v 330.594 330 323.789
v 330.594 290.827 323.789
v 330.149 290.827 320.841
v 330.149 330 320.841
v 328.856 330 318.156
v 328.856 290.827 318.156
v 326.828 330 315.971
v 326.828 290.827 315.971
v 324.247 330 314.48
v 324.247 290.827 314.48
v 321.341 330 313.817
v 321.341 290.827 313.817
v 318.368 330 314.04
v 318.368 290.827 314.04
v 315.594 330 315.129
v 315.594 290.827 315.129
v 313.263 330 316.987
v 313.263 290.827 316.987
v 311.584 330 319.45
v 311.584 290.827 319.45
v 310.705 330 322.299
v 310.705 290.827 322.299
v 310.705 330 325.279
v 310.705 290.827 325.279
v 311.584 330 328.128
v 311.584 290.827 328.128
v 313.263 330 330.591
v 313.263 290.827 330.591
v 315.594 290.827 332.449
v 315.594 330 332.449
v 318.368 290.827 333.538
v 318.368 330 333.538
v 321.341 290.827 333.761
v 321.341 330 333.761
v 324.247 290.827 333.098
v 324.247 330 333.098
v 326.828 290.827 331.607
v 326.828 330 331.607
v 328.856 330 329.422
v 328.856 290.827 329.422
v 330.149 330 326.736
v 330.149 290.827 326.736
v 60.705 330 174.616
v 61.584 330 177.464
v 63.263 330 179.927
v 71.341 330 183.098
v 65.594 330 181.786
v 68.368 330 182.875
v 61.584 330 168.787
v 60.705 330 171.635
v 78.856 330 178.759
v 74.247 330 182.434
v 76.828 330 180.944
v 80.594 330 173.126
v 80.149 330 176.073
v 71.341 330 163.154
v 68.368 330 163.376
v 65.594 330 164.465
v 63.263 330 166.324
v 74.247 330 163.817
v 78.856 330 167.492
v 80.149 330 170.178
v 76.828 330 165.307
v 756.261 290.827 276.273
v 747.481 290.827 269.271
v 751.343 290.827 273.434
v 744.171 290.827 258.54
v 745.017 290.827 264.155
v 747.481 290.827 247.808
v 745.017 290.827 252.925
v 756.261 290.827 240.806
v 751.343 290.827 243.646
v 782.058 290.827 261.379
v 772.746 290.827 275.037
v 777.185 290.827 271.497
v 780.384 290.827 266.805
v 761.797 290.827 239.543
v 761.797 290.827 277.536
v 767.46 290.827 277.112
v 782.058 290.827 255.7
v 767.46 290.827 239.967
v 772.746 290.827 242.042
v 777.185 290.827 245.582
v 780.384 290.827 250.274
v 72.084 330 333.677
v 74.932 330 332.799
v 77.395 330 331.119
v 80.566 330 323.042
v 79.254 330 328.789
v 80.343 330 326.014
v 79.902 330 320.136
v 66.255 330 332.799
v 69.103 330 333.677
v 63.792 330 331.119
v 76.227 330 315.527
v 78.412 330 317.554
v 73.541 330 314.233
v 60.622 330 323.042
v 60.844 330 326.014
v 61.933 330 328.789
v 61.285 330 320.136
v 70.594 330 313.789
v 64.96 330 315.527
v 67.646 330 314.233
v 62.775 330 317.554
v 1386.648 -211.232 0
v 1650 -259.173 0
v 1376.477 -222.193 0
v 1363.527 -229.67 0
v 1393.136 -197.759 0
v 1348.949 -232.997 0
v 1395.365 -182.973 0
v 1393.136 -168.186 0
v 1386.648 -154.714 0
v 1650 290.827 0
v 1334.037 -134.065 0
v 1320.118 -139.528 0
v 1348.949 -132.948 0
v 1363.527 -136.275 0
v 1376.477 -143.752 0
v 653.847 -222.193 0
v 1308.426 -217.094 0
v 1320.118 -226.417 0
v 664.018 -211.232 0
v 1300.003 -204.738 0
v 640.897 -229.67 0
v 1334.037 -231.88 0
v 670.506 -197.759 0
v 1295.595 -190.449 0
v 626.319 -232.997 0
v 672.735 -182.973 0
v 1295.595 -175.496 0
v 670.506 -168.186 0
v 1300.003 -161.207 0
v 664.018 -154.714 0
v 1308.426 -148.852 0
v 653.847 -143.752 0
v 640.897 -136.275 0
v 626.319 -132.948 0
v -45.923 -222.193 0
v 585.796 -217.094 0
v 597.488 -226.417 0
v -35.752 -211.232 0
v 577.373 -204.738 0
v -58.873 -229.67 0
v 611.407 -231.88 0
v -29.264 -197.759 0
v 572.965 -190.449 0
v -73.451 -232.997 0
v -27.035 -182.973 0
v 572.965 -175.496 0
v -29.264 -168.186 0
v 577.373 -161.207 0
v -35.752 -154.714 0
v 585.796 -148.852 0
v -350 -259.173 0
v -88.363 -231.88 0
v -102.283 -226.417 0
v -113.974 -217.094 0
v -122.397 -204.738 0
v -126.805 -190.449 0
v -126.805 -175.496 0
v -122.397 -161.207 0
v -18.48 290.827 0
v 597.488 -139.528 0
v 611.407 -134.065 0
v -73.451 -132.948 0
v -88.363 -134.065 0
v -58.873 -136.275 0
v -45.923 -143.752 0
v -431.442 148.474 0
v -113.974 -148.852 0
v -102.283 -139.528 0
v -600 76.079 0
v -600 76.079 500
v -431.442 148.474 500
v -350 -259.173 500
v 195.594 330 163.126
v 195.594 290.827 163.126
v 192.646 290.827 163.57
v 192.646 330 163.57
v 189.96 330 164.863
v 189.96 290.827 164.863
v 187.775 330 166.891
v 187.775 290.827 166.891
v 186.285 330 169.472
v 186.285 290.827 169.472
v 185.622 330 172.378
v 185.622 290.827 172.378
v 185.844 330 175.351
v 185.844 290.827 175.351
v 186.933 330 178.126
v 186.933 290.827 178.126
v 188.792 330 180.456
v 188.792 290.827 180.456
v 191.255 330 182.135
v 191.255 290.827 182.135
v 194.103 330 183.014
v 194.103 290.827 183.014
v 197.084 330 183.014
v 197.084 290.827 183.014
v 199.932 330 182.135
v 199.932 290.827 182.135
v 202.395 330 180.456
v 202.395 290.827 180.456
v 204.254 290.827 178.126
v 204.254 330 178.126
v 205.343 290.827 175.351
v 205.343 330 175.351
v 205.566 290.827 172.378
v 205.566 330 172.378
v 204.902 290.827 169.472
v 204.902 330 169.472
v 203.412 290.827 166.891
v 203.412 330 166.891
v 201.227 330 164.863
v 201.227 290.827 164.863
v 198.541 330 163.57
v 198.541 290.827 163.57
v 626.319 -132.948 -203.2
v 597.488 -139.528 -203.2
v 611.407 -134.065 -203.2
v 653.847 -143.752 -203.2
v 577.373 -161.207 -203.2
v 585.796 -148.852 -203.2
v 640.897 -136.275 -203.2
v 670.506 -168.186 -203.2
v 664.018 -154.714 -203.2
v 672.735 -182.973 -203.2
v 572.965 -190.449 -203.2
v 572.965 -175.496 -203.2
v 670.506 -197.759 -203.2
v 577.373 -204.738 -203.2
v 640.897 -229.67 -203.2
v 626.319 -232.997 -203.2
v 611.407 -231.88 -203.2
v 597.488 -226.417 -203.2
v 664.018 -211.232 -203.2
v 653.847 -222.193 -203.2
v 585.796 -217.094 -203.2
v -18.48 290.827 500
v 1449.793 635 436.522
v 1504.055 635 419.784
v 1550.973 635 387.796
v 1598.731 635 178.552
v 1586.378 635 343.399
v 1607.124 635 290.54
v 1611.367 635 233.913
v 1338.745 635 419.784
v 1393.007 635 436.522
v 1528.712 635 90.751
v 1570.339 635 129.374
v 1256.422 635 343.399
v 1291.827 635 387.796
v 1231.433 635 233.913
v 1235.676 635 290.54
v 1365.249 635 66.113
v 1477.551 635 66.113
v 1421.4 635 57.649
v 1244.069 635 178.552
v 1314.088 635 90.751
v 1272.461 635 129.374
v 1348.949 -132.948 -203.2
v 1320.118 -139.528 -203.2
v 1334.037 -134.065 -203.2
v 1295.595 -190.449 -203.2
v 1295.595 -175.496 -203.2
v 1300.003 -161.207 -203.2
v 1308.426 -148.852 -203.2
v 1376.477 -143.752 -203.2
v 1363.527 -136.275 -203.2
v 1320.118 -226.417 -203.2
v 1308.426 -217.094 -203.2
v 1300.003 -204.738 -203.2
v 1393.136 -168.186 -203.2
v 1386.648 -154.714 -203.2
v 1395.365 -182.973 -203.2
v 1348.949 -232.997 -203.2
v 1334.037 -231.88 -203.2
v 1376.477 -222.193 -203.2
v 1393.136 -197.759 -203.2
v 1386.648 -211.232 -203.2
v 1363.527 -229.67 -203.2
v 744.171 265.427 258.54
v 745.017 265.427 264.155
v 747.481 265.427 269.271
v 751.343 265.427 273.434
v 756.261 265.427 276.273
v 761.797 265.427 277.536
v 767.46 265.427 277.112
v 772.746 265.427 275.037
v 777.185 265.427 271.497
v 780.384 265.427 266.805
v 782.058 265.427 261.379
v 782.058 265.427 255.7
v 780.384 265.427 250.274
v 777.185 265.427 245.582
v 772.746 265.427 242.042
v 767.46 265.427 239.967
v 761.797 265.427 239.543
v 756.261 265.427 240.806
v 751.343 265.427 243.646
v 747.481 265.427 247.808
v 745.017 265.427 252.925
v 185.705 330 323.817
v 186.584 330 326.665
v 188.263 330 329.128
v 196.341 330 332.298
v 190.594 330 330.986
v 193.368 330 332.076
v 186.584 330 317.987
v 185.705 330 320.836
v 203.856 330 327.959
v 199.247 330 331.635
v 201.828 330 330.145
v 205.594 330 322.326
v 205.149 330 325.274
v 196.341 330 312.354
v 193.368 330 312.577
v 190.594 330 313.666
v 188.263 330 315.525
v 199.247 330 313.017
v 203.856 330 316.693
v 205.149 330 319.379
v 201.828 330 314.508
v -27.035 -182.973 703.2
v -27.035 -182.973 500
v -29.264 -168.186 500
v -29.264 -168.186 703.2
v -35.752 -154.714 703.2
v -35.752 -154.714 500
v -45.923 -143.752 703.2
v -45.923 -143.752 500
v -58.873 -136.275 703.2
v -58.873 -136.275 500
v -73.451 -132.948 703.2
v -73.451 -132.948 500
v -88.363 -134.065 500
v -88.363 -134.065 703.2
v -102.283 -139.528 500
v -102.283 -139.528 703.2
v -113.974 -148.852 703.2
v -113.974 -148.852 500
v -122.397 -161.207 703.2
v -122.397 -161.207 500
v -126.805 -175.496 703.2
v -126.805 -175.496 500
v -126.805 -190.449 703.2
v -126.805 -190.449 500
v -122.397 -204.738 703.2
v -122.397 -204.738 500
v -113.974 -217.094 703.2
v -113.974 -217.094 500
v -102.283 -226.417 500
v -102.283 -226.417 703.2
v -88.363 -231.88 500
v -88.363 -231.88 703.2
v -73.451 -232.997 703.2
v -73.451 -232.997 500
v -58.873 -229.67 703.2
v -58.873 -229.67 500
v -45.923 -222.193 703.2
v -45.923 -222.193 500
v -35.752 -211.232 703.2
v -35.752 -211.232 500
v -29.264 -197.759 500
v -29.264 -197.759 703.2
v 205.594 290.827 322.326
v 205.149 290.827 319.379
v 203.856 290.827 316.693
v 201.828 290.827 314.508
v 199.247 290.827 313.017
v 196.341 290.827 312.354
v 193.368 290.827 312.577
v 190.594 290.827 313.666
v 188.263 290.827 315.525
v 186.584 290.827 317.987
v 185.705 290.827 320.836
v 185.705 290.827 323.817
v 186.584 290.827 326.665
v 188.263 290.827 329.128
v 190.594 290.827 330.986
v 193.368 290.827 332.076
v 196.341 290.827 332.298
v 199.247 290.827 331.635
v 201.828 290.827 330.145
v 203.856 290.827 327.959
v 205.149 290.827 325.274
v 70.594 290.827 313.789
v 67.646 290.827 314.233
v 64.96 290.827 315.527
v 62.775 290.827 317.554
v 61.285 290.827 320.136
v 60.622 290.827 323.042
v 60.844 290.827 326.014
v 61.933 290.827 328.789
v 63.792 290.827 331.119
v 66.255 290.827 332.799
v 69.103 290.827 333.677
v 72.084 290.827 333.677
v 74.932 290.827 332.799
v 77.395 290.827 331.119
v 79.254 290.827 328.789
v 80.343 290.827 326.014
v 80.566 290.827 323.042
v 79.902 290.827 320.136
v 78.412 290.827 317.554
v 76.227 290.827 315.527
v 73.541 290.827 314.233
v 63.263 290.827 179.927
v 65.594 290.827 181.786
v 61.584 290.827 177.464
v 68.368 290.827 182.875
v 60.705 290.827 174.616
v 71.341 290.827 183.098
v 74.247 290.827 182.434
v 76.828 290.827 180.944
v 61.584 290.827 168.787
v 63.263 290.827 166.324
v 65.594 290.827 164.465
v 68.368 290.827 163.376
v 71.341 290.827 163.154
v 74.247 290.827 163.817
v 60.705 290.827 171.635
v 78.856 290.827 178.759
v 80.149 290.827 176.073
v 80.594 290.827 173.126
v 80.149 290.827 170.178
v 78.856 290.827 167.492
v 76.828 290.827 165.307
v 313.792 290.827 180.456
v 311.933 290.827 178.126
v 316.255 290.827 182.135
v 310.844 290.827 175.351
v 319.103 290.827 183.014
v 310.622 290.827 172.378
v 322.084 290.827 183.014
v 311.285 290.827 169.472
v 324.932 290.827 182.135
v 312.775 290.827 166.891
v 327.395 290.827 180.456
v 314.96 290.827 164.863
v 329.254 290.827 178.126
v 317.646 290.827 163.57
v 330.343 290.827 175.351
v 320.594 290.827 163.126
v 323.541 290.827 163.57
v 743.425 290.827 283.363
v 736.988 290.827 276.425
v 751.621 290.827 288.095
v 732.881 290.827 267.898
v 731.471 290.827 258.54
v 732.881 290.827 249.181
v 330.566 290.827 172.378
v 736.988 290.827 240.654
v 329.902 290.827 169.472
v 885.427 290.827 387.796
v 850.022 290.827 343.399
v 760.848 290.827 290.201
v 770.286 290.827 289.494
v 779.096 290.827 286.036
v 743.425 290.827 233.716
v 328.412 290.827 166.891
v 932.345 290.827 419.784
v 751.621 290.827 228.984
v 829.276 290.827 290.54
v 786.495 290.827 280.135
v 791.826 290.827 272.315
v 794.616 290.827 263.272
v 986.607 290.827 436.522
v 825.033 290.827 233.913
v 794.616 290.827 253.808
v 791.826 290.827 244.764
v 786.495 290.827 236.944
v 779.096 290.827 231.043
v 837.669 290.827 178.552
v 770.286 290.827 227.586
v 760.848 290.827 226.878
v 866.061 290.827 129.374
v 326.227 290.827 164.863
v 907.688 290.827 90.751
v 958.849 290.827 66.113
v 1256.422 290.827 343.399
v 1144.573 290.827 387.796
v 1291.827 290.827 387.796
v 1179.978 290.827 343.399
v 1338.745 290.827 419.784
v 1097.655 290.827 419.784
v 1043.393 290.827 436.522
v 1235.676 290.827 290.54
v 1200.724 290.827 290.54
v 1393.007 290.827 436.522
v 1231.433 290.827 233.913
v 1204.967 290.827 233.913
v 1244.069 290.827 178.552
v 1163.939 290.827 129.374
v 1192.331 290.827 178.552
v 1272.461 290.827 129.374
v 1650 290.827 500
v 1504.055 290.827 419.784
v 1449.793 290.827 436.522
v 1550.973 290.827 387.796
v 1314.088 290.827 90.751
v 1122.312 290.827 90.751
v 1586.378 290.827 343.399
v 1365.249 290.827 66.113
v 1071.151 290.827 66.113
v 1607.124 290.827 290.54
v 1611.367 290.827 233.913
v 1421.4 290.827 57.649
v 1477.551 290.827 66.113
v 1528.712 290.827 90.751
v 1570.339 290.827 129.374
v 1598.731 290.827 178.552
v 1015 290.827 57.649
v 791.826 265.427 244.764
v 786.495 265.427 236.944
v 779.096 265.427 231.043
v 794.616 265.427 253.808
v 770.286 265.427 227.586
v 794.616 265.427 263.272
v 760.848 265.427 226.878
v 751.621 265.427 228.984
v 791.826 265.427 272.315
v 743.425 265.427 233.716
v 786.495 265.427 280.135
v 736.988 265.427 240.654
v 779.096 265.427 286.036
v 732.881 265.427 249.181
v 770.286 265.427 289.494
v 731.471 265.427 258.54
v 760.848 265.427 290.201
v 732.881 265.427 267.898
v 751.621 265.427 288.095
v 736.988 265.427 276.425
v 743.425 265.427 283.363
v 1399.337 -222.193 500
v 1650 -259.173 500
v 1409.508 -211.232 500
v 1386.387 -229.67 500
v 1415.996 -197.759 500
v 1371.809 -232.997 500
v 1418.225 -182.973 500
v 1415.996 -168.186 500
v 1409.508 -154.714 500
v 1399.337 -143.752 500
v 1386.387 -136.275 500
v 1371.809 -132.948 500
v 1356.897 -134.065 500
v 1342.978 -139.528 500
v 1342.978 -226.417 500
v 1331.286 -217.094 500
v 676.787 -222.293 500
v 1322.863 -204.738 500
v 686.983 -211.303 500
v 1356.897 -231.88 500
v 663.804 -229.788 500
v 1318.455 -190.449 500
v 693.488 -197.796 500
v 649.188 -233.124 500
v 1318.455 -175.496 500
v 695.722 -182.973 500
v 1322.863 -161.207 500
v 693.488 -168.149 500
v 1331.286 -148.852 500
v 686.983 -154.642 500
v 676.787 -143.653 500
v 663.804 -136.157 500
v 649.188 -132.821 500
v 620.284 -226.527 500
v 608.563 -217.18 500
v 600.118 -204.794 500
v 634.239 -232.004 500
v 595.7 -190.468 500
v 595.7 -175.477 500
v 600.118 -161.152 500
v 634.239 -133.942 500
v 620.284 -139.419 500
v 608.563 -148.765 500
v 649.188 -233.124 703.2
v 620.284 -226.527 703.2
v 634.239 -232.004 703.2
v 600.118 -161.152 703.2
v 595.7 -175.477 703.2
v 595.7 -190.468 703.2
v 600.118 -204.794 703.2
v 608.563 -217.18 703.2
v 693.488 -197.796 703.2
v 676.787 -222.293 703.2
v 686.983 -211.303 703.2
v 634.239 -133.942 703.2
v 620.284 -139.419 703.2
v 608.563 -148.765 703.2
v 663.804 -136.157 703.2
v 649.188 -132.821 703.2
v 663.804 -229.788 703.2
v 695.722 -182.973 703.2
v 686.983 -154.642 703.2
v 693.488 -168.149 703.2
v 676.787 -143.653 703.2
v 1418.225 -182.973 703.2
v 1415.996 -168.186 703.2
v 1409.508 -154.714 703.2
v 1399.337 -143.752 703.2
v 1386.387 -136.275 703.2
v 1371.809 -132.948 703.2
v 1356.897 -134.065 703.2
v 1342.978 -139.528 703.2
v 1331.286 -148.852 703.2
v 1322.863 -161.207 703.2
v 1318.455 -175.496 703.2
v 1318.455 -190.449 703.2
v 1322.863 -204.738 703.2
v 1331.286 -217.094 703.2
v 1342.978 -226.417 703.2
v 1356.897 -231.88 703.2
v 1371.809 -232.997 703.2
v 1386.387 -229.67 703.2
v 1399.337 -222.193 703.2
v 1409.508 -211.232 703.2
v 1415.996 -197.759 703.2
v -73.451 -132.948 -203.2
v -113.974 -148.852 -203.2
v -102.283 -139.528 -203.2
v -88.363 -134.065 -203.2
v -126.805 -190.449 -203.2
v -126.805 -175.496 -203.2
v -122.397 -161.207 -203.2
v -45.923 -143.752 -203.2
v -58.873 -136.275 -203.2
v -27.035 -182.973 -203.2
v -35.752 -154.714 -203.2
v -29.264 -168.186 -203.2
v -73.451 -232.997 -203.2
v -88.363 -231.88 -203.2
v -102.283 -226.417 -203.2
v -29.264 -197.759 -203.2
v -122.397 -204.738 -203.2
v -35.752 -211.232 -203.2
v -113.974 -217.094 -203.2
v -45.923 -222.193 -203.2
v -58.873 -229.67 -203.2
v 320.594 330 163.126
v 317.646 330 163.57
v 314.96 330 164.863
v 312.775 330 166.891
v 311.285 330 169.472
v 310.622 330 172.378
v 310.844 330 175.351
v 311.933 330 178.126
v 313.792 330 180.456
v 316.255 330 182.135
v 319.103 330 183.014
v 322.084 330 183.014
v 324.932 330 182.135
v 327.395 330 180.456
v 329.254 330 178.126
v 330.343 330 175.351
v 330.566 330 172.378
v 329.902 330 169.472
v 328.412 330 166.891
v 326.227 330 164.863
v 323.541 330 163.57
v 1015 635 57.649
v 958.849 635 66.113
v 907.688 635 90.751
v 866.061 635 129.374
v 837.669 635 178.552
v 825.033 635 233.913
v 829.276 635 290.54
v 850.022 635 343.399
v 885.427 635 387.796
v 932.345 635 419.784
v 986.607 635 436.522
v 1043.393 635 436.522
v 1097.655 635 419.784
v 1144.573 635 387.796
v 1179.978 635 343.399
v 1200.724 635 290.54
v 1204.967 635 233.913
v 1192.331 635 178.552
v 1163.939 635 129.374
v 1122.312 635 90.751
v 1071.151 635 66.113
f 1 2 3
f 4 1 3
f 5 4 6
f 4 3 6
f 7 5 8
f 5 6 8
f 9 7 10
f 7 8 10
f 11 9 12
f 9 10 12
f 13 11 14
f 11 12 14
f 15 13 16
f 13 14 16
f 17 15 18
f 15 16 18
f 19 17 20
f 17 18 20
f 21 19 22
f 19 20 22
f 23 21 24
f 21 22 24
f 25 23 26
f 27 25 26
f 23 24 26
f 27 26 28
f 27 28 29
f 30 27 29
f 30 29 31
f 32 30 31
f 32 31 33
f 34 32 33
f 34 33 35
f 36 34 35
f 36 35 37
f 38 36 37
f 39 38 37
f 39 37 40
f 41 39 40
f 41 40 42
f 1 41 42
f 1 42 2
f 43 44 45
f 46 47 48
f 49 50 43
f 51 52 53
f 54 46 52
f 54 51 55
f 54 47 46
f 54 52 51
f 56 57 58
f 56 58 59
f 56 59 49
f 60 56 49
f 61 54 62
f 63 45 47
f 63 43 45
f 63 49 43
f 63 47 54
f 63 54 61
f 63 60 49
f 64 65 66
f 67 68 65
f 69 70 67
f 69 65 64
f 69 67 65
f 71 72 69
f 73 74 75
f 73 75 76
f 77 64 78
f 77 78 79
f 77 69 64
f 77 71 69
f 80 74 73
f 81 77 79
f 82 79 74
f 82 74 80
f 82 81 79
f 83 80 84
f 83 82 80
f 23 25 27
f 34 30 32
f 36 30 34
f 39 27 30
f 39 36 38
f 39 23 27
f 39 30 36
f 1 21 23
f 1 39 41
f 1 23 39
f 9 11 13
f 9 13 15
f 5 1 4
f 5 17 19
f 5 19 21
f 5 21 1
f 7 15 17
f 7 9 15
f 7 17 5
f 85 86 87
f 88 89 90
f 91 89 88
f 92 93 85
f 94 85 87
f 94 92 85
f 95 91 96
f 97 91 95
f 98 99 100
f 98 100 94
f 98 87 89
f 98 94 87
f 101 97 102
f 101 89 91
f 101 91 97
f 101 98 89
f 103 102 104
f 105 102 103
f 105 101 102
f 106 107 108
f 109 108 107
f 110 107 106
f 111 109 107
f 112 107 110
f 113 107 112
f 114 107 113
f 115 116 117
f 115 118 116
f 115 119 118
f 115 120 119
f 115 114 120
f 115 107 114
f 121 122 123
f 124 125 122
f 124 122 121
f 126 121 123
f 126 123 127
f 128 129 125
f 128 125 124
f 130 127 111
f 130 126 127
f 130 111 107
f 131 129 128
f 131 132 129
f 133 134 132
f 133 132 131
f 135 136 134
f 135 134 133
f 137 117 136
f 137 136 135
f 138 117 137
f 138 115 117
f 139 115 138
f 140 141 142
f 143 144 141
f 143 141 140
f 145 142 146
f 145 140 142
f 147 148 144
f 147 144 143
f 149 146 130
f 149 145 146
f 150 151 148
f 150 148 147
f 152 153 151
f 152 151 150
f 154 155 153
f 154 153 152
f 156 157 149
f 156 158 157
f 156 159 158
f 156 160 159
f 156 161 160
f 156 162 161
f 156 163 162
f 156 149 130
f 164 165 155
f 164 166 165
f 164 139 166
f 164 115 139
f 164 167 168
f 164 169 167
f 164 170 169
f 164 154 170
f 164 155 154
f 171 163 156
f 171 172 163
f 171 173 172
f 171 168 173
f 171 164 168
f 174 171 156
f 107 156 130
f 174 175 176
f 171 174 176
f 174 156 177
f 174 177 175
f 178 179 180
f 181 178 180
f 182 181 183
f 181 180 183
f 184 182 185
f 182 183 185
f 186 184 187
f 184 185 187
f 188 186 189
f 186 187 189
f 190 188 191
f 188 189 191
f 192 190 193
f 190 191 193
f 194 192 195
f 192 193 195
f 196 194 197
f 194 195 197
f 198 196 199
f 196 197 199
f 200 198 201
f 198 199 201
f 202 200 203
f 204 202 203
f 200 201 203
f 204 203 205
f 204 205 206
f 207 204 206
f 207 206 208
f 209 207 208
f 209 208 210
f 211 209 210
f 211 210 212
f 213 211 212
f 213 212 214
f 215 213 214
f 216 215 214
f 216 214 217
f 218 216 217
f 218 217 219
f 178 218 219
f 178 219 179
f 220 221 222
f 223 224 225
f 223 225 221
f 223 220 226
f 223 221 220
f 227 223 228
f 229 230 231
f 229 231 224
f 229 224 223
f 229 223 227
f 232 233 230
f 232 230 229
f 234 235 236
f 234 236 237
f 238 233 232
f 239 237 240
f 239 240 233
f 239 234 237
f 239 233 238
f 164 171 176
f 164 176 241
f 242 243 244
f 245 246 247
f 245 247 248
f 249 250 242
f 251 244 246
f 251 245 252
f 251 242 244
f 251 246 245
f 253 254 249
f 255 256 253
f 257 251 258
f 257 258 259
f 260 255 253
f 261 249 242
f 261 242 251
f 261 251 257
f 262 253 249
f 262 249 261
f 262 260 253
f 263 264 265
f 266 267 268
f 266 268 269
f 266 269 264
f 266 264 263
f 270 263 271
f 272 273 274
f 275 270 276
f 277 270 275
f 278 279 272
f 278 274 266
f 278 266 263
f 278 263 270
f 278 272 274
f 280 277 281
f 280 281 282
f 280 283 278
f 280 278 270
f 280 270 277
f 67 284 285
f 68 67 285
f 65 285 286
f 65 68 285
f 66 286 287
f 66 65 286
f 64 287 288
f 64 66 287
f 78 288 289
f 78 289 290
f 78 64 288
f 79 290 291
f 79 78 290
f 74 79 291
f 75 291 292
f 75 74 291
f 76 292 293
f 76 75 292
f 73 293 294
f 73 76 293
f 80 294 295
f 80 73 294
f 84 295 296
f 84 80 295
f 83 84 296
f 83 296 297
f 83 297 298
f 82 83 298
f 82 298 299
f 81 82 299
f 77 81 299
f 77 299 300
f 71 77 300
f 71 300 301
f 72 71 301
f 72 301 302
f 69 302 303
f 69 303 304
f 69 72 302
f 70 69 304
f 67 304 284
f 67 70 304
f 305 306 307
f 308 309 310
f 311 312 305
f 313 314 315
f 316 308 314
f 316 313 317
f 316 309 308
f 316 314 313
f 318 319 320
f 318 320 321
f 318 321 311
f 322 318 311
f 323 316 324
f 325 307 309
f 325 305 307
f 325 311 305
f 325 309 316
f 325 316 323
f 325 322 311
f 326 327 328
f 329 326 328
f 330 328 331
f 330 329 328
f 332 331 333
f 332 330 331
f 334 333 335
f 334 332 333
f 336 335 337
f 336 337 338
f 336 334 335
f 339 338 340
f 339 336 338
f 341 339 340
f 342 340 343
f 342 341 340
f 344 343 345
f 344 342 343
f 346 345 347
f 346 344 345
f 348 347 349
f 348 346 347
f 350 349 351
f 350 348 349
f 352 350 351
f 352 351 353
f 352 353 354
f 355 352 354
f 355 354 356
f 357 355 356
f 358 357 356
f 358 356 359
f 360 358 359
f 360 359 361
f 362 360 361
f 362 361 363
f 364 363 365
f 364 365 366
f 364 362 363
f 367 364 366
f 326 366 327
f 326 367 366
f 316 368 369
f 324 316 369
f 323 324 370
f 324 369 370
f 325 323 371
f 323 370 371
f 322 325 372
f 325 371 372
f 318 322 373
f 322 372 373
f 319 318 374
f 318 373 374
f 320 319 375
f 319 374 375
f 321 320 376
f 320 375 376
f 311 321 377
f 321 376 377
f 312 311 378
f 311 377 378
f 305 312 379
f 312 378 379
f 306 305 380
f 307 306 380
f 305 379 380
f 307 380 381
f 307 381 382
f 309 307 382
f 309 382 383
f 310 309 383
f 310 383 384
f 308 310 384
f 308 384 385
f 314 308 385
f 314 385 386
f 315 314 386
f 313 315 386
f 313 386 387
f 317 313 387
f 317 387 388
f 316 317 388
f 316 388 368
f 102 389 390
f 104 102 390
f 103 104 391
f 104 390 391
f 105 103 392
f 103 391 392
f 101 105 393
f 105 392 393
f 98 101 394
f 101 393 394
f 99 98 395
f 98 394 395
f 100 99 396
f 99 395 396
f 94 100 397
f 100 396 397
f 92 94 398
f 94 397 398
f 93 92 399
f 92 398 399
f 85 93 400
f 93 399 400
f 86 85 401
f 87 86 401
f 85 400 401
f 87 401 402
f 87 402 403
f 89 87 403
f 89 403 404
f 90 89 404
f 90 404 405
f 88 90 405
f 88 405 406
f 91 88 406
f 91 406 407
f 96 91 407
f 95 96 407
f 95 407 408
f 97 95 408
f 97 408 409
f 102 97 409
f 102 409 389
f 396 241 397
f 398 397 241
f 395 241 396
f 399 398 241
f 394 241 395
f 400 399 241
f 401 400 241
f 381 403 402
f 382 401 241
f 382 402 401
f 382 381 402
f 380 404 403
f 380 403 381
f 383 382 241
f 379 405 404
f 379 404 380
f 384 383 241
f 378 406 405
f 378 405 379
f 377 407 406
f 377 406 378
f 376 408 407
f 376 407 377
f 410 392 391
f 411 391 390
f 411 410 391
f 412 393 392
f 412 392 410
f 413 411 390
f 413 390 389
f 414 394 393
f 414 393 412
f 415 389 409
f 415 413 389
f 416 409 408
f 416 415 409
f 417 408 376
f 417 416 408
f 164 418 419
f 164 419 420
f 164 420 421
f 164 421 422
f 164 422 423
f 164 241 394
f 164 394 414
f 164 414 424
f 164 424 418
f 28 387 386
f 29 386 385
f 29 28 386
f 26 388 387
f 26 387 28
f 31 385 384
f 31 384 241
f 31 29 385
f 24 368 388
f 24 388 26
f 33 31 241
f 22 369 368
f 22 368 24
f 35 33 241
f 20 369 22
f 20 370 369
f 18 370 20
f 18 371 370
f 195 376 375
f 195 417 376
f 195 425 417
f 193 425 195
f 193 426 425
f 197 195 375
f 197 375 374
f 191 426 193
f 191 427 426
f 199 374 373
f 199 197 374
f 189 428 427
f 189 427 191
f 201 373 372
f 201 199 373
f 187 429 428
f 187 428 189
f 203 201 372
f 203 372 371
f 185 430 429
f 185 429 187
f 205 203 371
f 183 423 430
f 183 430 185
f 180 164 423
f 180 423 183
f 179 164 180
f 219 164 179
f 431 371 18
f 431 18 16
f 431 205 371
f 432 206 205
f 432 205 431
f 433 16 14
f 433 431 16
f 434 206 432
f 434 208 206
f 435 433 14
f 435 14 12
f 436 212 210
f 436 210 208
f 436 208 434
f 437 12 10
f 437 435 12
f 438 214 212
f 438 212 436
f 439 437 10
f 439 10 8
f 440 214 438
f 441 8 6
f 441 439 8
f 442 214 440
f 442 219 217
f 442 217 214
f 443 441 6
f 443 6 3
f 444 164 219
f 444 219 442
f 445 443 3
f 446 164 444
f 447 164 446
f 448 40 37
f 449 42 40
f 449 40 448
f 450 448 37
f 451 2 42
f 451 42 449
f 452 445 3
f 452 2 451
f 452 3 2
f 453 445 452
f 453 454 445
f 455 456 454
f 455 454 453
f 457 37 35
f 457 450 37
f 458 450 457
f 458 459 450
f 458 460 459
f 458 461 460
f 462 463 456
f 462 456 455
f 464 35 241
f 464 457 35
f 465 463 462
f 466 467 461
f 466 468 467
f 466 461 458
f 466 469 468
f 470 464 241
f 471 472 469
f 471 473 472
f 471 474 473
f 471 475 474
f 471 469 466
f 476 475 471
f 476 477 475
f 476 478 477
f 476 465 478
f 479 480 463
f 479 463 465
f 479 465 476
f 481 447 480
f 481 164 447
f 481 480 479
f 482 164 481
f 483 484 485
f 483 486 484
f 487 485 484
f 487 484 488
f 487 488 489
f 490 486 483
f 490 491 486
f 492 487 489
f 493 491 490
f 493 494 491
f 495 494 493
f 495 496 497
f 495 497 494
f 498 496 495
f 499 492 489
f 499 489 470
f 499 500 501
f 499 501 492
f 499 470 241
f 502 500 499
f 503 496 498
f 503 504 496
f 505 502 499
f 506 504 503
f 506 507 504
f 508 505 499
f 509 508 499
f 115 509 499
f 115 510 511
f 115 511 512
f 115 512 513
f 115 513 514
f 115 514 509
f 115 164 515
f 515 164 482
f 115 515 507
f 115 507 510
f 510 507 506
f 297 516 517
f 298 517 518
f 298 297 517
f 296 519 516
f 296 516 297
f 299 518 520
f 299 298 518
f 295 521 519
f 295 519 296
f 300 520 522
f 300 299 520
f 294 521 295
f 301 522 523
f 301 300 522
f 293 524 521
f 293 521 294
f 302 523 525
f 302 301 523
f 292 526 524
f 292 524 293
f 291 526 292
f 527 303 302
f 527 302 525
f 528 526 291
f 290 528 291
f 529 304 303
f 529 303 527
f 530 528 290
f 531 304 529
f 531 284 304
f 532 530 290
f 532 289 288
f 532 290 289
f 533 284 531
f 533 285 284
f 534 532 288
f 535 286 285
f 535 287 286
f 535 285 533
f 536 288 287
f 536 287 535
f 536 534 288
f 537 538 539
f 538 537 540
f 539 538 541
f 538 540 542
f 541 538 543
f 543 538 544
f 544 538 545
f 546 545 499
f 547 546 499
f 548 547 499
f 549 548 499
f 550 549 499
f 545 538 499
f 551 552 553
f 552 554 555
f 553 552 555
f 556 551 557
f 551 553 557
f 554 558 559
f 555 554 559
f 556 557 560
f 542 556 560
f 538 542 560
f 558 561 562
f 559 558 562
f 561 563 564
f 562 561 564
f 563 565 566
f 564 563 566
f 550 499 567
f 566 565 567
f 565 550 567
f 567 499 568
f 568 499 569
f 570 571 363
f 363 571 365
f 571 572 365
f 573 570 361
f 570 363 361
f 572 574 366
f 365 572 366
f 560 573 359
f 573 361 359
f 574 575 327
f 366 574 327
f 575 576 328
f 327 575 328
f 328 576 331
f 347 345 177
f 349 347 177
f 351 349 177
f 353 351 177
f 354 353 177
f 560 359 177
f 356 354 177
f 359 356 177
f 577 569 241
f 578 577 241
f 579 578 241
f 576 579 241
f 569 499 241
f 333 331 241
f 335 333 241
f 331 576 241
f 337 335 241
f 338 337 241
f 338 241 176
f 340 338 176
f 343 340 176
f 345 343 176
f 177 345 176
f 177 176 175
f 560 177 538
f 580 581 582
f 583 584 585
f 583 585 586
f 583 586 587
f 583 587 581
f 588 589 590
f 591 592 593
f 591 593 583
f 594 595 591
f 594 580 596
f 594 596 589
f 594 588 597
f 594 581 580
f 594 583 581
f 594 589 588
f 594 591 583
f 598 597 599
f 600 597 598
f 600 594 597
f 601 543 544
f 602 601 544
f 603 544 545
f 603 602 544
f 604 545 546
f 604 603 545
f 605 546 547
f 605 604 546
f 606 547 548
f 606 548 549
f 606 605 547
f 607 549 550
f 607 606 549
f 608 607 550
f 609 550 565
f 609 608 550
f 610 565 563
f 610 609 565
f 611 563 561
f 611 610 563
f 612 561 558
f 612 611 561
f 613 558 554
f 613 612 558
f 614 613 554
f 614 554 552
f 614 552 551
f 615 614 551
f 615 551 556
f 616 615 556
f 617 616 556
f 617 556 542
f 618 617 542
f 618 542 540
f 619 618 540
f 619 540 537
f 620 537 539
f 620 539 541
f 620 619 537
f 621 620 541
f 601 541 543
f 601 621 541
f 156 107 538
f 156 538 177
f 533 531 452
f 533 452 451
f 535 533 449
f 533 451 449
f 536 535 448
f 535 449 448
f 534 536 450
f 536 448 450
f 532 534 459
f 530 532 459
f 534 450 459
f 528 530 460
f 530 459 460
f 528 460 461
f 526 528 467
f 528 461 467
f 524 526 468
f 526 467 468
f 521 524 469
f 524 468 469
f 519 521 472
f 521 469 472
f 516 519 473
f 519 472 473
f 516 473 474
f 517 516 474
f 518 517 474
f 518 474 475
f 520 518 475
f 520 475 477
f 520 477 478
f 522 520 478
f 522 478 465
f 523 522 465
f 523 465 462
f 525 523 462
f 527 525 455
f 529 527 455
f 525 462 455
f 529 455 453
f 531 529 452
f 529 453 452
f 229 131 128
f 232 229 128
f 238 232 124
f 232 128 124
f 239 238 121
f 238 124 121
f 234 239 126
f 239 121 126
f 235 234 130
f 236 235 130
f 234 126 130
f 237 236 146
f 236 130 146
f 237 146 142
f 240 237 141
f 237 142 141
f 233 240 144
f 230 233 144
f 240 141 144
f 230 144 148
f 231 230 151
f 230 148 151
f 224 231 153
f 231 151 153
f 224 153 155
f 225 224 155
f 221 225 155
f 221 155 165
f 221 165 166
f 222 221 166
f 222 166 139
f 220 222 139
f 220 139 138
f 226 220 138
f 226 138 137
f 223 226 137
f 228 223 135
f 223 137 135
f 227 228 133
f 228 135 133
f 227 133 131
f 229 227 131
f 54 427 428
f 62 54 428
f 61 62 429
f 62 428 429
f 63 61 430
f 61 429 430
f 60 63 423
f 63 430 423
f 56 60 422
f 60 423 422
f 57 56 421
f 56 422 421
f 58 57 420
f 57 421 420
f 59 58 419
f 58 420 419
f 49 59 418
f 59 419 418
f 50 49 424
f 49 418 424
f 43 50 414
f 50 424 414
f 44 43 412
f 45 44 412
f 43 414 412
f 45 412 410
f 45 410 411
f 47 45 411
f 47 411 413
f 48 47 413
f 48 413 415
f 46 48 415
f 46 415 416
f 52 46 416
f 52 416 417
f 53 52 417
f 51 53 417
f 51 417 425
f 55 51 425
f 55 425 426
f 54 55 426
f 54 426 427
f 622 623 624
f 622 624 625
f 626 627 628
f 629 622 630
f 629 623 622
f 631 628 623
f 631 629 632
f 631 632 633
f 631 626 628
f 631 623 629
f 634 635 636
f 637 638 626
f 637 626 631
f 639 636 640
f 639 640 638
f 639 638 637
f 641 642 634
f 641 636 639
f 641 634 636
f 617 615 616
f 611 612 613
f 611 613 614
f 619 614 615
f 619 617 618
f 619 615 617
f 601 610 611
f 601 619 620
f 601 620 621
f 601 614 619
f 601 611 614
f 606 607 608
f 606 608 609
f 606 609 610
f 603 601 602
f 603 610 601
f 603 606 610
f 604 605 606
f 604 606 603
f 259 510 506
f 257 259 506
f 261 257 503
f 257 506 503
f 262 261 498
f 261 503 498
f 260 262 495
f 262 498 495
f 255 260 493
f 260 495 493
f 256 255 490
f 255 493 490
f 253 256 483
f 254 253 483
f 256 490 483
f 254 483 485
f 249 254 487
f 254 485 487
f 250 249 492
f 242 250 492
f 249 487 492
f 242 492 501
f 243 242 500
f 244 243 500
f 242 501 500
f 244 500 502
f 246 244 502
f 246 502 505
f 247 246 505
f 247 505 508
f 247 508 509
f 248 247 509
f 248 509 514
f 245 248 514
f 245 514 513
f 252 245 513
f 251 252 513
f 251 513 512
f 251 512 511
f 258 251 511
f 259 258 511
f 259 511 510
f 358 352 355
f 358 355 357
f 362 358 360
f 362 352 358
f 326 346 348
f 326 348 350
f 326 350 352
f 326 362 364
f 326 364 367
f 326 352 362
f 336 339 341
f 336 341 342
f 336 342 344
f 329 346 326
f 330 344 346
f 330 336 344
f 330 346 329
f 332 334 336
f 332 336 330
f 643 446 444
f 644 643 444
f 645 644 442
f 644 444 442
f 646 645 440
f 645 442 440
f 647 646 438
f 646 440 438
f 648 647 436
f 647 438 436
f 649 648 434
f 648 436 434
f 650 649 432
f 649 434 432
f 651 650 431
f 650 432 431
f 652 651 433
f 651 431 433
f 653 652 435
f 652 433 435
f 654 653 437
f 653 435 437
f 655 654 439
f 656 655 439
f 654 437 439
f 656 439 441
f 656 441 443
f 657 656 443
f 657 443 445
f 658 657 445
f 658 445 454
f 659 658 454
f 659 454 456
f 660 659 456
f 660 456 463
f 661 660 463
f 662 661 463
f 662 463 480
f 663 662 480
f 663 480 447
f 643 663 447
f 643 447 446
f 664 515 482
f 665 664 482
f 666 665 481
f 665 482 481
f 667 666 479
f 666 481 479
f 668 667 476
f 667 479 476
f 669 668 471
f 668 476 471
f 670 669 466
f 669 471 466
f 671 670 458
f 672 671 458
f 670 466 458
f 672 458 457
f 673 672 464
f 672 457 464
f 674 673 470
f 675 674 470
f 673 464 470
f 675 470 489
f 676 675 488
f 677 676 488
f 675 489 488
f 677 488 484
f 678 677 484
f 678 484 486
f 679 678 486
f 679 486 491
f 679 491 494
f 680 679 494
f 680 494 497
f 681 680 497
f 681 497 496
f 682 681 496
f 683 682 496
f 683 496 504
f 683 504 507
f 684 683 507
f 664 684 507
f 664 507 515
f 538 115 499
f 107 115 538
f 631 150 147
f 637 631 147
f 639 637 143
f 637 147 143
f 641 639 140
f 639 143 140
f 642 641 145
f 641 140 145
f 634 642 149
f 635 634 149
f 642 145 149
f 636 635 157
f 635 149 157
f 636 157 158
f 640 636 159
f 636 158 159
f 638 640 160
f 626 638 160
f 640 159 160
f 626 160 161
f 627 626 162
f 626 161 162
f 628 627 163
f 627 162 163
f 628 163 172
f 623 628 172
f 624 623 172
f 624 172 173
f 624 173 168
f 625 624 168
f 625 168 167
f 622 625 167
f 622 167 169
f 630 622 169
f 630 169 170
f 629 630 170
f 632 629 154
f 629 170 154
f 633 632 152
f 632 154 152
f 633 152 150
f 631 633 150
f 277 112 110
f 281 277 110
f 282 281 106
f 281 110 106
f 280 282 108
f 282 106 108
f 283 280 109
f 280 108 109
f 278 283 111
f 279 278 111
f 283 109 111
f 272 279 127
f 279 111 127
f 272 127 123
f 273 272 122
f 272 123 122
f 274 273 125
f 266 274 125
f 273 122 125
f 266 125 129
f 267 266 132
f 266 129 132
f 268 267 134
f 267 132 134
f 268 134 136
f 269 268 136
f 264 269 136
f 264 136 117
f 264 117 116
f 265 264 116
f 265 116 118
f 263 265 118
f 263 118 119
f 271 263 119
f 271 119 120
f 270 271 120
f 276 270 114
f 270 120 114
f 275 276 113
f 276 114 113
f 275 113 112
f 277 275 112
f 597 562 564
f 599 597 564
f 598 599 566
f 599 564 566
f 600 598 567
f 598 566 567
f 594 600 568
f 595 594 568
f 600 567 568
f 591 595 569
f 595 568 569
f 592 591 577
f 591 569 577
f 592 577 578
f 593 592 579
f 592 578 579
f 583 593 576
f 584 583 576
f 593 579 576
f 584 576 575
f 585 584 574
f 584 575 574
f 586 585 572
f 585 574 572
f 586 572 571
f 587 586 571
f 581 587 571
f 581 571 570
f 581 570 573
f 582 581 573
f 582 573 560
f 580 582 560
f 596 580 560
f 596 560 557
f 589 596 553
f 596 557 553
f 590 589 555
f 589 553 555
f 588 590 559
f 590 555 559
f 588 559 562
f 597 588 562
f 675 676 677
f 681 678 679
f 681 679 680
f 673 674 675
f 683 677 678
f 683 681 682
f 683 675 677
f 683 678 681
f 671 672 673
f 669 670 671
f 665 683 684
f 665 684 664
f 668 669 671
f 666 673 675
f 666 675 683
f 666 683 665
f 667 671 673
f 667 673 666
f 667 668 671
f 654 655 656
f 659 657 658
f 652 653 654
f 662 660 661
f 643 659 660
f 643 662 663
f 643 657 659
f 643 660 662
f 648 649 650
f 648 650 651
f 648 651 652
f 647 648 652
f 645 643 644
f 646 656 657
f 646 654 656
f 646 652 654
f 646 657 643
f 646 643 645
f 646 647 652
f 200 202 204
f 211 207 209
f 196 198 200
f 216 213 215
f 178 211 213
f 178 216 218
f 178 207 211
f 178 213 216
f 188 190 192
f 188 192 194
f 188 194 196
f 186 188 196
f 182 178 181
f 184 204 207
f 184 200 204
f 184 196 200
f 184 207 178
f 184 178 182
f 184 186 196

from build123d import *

# Parameters (mm, degrees)
BOSS_EXTRUDE1_DEPTH     = 500
CUT_EXTRUDE2_DEPTH      = 1749.450897396
CUT_EXTRUDE2_DEPTH_BACK = 1749.450897396
SKETCH11_R              = 10
BOSS_EXTRUDE8_DEPTH     = 330
SKETCH12_R              = 50.165
BOSS_EXTRUDE14_DEPTH    = 203.2
BOSS_EXTRUDE15_START    = 203.2
SKETCH15_R              = 50.165
BOSS_EXTRUDE15_DEPTH    = 203.2
SKETCH17_R              = 50.292
BOSS_EXTRUDE16_DEPTH    = 203.2
SKETCH18_R              = 50.165
BOSS_EXTRUDE17_DEPTH    = 203.2
SKETCH9_R               = 190.5
BOSS_EXTRUDE19_DEPTH    = 635
SKETCH19_R              = 31.75
SKETCH19_R_2            = 19.05
CUT_EXTRUDE5_DEPTH      = 25.4


with BuildPart() as part:
    # Sketch2 → Boss-Extrude1 (new body)
    with BuildSketch(Plane.XY):
        Polygon((-600, 76.079136691), (-100, 290.827338129), (1650, 290.827338129), (1650, -259.172661871), (-350, -259.172661871), align=None)
    extrude(amount=BOSS_EXTRUDE1_DEPTH)

    # Sketch3 → Cut-Extrude2 (cut, two sides: drawn at the far end of the back side and taken through both)
    with BuildSketch(Plane.XY.offset(-CUT_EXTRUDE2_DEPTH_BACK)):
        Polygon((-629.160159728, 80.318281341), (0, 297.197748554), (-133.945595933, 297.197748554), align=None)
    extrude(amount=CUT_EXTRUDE2_DEPTH + CUT_EXTRUDE2_DEPTH_BACK, mode=Mode.SUBTRACT)

    # Sketch11 → Boss-Extrude8 (add)
    with BuildSketch(Plane(origin=(0, 0, 0), x_dir=(1, 0, 0), z_dir=(0, 1, 0))):
        with Locations((320.593573559, -323.788946962)):
            Circle(SKETCH11_R)
        with Locations(Location((70.593573559, -323.788946962, 0), (0, 0, 90))):
            Circle(SKETCH11_R)
        with Locations((195.593573559, -322.326233751)):
            Circle(SKETCH11_R)
        with Locations(Location((320.593573559, -173.125553361, 0), (0, 0, 90))):
            Circle(SKETCH11_R)
        with Locations(Location((195.593573559, -173.125553361, 0), (0, 0, 90))):
            Circle(SKETCH11_R)
        with Locations((70.593573559, -173.125553361)):
            Circle(SKETCH11_R)
    extrude(amount=BOSS_EXTRUDE8_DEPTH)

    # Sketch12 → Boss-Extrude14 (add)
    with BuildSketch(Plane(origin=(0, 0, 0), x_dir=(-1, 0, 0), z_dir=(0, 0, -1))):
        with Locations(Location((-1345.2, -182.972661871, 0), (0, 0, 180))):
            Circle(SKETCH12_R)
        with Locations(Location((77.2, -182.972661871, 0), (0, 0, 180))):
            Circle(SKETCH12_R)
    extrude(amount=BOSS_EXTRUDE14_DEPTH)

    # Sketch15 → Boss-Extrude15 (add)
    with BuildSketch(Plane.XY.offset(500).offset(BOSS_EXTRUDE15_START)):
        with Locations((1368.06, -182.972661871)):
            Circle(SKETCH15_R)
        with Locations((-77.2, -182.972661871)):
            Circle(SKETCH15_R)
    extrude(amount=-BOSS_EXTRUDE15_DEPTH)

    # Sketch17 → Boss-Extrude16 (add, through all)
    with BuildSketch(Plane.XY.offset(500)):
        with Locations((645.43, -182.972661871)):
            Circle(SKETCH17_R)
    extrude(amount=BOSS_EXTRUDE16_DEPTH)

    # Sketch18 → Boss-Extrude17 (add, through all)
    with BuildSketch(Plane(origin=(0, 0, 0), x_dir=(-1, 0, 0), z_dir=(0, 0, -1))):
        with Locations(Location((-622.57, -182.972661871, 0), (0, 0, 180))):
            Circle(SKETCH18_R)
    extrude(amount=BOSS_EXTRUDE17_DEPTH)

    # Sketch9 → Boss-Extrude19 (add)
    with BuildSketch(Plane(origin=(0, 0, 0), x_dir=(1, 0, 0), z_dir=(0, 1, 0))):
        with Locations(Location((1421.4, -248.149283127, 0), (0, 0, 90))):
            Circle(SKETCH9_R)
        with Locations(Location((1015, -248.149283127, 0), (0, 0, 90))):
            Circle(SKETCH9_R)
    extrude(amount=BOSS_EXTRUDE19_DEPTH)

    # Sketch19 → Cut-Extrude5 (cut)
    with BuildSketch(Plane(origin=(0, 290.827338129, 0), x_dir=(1, 0, 0), z_dir=(0, 1, 0))):
        with Locations(Location((763.220602861, -258.539612091, 0), (0, 0, 180))):
            Circle(SKETCH19_R)
        with Locations(Location((763.220602861, -258.539612091, 0), (0, 0, 180))):
            Circle(SKETCH19_R_2, mode=Mode.SUBTRACT)
    extrude(amount=-CUT_EXTRUDE5_DEPTH, mode=Mode.SUBTRACT)


solid = part.part
